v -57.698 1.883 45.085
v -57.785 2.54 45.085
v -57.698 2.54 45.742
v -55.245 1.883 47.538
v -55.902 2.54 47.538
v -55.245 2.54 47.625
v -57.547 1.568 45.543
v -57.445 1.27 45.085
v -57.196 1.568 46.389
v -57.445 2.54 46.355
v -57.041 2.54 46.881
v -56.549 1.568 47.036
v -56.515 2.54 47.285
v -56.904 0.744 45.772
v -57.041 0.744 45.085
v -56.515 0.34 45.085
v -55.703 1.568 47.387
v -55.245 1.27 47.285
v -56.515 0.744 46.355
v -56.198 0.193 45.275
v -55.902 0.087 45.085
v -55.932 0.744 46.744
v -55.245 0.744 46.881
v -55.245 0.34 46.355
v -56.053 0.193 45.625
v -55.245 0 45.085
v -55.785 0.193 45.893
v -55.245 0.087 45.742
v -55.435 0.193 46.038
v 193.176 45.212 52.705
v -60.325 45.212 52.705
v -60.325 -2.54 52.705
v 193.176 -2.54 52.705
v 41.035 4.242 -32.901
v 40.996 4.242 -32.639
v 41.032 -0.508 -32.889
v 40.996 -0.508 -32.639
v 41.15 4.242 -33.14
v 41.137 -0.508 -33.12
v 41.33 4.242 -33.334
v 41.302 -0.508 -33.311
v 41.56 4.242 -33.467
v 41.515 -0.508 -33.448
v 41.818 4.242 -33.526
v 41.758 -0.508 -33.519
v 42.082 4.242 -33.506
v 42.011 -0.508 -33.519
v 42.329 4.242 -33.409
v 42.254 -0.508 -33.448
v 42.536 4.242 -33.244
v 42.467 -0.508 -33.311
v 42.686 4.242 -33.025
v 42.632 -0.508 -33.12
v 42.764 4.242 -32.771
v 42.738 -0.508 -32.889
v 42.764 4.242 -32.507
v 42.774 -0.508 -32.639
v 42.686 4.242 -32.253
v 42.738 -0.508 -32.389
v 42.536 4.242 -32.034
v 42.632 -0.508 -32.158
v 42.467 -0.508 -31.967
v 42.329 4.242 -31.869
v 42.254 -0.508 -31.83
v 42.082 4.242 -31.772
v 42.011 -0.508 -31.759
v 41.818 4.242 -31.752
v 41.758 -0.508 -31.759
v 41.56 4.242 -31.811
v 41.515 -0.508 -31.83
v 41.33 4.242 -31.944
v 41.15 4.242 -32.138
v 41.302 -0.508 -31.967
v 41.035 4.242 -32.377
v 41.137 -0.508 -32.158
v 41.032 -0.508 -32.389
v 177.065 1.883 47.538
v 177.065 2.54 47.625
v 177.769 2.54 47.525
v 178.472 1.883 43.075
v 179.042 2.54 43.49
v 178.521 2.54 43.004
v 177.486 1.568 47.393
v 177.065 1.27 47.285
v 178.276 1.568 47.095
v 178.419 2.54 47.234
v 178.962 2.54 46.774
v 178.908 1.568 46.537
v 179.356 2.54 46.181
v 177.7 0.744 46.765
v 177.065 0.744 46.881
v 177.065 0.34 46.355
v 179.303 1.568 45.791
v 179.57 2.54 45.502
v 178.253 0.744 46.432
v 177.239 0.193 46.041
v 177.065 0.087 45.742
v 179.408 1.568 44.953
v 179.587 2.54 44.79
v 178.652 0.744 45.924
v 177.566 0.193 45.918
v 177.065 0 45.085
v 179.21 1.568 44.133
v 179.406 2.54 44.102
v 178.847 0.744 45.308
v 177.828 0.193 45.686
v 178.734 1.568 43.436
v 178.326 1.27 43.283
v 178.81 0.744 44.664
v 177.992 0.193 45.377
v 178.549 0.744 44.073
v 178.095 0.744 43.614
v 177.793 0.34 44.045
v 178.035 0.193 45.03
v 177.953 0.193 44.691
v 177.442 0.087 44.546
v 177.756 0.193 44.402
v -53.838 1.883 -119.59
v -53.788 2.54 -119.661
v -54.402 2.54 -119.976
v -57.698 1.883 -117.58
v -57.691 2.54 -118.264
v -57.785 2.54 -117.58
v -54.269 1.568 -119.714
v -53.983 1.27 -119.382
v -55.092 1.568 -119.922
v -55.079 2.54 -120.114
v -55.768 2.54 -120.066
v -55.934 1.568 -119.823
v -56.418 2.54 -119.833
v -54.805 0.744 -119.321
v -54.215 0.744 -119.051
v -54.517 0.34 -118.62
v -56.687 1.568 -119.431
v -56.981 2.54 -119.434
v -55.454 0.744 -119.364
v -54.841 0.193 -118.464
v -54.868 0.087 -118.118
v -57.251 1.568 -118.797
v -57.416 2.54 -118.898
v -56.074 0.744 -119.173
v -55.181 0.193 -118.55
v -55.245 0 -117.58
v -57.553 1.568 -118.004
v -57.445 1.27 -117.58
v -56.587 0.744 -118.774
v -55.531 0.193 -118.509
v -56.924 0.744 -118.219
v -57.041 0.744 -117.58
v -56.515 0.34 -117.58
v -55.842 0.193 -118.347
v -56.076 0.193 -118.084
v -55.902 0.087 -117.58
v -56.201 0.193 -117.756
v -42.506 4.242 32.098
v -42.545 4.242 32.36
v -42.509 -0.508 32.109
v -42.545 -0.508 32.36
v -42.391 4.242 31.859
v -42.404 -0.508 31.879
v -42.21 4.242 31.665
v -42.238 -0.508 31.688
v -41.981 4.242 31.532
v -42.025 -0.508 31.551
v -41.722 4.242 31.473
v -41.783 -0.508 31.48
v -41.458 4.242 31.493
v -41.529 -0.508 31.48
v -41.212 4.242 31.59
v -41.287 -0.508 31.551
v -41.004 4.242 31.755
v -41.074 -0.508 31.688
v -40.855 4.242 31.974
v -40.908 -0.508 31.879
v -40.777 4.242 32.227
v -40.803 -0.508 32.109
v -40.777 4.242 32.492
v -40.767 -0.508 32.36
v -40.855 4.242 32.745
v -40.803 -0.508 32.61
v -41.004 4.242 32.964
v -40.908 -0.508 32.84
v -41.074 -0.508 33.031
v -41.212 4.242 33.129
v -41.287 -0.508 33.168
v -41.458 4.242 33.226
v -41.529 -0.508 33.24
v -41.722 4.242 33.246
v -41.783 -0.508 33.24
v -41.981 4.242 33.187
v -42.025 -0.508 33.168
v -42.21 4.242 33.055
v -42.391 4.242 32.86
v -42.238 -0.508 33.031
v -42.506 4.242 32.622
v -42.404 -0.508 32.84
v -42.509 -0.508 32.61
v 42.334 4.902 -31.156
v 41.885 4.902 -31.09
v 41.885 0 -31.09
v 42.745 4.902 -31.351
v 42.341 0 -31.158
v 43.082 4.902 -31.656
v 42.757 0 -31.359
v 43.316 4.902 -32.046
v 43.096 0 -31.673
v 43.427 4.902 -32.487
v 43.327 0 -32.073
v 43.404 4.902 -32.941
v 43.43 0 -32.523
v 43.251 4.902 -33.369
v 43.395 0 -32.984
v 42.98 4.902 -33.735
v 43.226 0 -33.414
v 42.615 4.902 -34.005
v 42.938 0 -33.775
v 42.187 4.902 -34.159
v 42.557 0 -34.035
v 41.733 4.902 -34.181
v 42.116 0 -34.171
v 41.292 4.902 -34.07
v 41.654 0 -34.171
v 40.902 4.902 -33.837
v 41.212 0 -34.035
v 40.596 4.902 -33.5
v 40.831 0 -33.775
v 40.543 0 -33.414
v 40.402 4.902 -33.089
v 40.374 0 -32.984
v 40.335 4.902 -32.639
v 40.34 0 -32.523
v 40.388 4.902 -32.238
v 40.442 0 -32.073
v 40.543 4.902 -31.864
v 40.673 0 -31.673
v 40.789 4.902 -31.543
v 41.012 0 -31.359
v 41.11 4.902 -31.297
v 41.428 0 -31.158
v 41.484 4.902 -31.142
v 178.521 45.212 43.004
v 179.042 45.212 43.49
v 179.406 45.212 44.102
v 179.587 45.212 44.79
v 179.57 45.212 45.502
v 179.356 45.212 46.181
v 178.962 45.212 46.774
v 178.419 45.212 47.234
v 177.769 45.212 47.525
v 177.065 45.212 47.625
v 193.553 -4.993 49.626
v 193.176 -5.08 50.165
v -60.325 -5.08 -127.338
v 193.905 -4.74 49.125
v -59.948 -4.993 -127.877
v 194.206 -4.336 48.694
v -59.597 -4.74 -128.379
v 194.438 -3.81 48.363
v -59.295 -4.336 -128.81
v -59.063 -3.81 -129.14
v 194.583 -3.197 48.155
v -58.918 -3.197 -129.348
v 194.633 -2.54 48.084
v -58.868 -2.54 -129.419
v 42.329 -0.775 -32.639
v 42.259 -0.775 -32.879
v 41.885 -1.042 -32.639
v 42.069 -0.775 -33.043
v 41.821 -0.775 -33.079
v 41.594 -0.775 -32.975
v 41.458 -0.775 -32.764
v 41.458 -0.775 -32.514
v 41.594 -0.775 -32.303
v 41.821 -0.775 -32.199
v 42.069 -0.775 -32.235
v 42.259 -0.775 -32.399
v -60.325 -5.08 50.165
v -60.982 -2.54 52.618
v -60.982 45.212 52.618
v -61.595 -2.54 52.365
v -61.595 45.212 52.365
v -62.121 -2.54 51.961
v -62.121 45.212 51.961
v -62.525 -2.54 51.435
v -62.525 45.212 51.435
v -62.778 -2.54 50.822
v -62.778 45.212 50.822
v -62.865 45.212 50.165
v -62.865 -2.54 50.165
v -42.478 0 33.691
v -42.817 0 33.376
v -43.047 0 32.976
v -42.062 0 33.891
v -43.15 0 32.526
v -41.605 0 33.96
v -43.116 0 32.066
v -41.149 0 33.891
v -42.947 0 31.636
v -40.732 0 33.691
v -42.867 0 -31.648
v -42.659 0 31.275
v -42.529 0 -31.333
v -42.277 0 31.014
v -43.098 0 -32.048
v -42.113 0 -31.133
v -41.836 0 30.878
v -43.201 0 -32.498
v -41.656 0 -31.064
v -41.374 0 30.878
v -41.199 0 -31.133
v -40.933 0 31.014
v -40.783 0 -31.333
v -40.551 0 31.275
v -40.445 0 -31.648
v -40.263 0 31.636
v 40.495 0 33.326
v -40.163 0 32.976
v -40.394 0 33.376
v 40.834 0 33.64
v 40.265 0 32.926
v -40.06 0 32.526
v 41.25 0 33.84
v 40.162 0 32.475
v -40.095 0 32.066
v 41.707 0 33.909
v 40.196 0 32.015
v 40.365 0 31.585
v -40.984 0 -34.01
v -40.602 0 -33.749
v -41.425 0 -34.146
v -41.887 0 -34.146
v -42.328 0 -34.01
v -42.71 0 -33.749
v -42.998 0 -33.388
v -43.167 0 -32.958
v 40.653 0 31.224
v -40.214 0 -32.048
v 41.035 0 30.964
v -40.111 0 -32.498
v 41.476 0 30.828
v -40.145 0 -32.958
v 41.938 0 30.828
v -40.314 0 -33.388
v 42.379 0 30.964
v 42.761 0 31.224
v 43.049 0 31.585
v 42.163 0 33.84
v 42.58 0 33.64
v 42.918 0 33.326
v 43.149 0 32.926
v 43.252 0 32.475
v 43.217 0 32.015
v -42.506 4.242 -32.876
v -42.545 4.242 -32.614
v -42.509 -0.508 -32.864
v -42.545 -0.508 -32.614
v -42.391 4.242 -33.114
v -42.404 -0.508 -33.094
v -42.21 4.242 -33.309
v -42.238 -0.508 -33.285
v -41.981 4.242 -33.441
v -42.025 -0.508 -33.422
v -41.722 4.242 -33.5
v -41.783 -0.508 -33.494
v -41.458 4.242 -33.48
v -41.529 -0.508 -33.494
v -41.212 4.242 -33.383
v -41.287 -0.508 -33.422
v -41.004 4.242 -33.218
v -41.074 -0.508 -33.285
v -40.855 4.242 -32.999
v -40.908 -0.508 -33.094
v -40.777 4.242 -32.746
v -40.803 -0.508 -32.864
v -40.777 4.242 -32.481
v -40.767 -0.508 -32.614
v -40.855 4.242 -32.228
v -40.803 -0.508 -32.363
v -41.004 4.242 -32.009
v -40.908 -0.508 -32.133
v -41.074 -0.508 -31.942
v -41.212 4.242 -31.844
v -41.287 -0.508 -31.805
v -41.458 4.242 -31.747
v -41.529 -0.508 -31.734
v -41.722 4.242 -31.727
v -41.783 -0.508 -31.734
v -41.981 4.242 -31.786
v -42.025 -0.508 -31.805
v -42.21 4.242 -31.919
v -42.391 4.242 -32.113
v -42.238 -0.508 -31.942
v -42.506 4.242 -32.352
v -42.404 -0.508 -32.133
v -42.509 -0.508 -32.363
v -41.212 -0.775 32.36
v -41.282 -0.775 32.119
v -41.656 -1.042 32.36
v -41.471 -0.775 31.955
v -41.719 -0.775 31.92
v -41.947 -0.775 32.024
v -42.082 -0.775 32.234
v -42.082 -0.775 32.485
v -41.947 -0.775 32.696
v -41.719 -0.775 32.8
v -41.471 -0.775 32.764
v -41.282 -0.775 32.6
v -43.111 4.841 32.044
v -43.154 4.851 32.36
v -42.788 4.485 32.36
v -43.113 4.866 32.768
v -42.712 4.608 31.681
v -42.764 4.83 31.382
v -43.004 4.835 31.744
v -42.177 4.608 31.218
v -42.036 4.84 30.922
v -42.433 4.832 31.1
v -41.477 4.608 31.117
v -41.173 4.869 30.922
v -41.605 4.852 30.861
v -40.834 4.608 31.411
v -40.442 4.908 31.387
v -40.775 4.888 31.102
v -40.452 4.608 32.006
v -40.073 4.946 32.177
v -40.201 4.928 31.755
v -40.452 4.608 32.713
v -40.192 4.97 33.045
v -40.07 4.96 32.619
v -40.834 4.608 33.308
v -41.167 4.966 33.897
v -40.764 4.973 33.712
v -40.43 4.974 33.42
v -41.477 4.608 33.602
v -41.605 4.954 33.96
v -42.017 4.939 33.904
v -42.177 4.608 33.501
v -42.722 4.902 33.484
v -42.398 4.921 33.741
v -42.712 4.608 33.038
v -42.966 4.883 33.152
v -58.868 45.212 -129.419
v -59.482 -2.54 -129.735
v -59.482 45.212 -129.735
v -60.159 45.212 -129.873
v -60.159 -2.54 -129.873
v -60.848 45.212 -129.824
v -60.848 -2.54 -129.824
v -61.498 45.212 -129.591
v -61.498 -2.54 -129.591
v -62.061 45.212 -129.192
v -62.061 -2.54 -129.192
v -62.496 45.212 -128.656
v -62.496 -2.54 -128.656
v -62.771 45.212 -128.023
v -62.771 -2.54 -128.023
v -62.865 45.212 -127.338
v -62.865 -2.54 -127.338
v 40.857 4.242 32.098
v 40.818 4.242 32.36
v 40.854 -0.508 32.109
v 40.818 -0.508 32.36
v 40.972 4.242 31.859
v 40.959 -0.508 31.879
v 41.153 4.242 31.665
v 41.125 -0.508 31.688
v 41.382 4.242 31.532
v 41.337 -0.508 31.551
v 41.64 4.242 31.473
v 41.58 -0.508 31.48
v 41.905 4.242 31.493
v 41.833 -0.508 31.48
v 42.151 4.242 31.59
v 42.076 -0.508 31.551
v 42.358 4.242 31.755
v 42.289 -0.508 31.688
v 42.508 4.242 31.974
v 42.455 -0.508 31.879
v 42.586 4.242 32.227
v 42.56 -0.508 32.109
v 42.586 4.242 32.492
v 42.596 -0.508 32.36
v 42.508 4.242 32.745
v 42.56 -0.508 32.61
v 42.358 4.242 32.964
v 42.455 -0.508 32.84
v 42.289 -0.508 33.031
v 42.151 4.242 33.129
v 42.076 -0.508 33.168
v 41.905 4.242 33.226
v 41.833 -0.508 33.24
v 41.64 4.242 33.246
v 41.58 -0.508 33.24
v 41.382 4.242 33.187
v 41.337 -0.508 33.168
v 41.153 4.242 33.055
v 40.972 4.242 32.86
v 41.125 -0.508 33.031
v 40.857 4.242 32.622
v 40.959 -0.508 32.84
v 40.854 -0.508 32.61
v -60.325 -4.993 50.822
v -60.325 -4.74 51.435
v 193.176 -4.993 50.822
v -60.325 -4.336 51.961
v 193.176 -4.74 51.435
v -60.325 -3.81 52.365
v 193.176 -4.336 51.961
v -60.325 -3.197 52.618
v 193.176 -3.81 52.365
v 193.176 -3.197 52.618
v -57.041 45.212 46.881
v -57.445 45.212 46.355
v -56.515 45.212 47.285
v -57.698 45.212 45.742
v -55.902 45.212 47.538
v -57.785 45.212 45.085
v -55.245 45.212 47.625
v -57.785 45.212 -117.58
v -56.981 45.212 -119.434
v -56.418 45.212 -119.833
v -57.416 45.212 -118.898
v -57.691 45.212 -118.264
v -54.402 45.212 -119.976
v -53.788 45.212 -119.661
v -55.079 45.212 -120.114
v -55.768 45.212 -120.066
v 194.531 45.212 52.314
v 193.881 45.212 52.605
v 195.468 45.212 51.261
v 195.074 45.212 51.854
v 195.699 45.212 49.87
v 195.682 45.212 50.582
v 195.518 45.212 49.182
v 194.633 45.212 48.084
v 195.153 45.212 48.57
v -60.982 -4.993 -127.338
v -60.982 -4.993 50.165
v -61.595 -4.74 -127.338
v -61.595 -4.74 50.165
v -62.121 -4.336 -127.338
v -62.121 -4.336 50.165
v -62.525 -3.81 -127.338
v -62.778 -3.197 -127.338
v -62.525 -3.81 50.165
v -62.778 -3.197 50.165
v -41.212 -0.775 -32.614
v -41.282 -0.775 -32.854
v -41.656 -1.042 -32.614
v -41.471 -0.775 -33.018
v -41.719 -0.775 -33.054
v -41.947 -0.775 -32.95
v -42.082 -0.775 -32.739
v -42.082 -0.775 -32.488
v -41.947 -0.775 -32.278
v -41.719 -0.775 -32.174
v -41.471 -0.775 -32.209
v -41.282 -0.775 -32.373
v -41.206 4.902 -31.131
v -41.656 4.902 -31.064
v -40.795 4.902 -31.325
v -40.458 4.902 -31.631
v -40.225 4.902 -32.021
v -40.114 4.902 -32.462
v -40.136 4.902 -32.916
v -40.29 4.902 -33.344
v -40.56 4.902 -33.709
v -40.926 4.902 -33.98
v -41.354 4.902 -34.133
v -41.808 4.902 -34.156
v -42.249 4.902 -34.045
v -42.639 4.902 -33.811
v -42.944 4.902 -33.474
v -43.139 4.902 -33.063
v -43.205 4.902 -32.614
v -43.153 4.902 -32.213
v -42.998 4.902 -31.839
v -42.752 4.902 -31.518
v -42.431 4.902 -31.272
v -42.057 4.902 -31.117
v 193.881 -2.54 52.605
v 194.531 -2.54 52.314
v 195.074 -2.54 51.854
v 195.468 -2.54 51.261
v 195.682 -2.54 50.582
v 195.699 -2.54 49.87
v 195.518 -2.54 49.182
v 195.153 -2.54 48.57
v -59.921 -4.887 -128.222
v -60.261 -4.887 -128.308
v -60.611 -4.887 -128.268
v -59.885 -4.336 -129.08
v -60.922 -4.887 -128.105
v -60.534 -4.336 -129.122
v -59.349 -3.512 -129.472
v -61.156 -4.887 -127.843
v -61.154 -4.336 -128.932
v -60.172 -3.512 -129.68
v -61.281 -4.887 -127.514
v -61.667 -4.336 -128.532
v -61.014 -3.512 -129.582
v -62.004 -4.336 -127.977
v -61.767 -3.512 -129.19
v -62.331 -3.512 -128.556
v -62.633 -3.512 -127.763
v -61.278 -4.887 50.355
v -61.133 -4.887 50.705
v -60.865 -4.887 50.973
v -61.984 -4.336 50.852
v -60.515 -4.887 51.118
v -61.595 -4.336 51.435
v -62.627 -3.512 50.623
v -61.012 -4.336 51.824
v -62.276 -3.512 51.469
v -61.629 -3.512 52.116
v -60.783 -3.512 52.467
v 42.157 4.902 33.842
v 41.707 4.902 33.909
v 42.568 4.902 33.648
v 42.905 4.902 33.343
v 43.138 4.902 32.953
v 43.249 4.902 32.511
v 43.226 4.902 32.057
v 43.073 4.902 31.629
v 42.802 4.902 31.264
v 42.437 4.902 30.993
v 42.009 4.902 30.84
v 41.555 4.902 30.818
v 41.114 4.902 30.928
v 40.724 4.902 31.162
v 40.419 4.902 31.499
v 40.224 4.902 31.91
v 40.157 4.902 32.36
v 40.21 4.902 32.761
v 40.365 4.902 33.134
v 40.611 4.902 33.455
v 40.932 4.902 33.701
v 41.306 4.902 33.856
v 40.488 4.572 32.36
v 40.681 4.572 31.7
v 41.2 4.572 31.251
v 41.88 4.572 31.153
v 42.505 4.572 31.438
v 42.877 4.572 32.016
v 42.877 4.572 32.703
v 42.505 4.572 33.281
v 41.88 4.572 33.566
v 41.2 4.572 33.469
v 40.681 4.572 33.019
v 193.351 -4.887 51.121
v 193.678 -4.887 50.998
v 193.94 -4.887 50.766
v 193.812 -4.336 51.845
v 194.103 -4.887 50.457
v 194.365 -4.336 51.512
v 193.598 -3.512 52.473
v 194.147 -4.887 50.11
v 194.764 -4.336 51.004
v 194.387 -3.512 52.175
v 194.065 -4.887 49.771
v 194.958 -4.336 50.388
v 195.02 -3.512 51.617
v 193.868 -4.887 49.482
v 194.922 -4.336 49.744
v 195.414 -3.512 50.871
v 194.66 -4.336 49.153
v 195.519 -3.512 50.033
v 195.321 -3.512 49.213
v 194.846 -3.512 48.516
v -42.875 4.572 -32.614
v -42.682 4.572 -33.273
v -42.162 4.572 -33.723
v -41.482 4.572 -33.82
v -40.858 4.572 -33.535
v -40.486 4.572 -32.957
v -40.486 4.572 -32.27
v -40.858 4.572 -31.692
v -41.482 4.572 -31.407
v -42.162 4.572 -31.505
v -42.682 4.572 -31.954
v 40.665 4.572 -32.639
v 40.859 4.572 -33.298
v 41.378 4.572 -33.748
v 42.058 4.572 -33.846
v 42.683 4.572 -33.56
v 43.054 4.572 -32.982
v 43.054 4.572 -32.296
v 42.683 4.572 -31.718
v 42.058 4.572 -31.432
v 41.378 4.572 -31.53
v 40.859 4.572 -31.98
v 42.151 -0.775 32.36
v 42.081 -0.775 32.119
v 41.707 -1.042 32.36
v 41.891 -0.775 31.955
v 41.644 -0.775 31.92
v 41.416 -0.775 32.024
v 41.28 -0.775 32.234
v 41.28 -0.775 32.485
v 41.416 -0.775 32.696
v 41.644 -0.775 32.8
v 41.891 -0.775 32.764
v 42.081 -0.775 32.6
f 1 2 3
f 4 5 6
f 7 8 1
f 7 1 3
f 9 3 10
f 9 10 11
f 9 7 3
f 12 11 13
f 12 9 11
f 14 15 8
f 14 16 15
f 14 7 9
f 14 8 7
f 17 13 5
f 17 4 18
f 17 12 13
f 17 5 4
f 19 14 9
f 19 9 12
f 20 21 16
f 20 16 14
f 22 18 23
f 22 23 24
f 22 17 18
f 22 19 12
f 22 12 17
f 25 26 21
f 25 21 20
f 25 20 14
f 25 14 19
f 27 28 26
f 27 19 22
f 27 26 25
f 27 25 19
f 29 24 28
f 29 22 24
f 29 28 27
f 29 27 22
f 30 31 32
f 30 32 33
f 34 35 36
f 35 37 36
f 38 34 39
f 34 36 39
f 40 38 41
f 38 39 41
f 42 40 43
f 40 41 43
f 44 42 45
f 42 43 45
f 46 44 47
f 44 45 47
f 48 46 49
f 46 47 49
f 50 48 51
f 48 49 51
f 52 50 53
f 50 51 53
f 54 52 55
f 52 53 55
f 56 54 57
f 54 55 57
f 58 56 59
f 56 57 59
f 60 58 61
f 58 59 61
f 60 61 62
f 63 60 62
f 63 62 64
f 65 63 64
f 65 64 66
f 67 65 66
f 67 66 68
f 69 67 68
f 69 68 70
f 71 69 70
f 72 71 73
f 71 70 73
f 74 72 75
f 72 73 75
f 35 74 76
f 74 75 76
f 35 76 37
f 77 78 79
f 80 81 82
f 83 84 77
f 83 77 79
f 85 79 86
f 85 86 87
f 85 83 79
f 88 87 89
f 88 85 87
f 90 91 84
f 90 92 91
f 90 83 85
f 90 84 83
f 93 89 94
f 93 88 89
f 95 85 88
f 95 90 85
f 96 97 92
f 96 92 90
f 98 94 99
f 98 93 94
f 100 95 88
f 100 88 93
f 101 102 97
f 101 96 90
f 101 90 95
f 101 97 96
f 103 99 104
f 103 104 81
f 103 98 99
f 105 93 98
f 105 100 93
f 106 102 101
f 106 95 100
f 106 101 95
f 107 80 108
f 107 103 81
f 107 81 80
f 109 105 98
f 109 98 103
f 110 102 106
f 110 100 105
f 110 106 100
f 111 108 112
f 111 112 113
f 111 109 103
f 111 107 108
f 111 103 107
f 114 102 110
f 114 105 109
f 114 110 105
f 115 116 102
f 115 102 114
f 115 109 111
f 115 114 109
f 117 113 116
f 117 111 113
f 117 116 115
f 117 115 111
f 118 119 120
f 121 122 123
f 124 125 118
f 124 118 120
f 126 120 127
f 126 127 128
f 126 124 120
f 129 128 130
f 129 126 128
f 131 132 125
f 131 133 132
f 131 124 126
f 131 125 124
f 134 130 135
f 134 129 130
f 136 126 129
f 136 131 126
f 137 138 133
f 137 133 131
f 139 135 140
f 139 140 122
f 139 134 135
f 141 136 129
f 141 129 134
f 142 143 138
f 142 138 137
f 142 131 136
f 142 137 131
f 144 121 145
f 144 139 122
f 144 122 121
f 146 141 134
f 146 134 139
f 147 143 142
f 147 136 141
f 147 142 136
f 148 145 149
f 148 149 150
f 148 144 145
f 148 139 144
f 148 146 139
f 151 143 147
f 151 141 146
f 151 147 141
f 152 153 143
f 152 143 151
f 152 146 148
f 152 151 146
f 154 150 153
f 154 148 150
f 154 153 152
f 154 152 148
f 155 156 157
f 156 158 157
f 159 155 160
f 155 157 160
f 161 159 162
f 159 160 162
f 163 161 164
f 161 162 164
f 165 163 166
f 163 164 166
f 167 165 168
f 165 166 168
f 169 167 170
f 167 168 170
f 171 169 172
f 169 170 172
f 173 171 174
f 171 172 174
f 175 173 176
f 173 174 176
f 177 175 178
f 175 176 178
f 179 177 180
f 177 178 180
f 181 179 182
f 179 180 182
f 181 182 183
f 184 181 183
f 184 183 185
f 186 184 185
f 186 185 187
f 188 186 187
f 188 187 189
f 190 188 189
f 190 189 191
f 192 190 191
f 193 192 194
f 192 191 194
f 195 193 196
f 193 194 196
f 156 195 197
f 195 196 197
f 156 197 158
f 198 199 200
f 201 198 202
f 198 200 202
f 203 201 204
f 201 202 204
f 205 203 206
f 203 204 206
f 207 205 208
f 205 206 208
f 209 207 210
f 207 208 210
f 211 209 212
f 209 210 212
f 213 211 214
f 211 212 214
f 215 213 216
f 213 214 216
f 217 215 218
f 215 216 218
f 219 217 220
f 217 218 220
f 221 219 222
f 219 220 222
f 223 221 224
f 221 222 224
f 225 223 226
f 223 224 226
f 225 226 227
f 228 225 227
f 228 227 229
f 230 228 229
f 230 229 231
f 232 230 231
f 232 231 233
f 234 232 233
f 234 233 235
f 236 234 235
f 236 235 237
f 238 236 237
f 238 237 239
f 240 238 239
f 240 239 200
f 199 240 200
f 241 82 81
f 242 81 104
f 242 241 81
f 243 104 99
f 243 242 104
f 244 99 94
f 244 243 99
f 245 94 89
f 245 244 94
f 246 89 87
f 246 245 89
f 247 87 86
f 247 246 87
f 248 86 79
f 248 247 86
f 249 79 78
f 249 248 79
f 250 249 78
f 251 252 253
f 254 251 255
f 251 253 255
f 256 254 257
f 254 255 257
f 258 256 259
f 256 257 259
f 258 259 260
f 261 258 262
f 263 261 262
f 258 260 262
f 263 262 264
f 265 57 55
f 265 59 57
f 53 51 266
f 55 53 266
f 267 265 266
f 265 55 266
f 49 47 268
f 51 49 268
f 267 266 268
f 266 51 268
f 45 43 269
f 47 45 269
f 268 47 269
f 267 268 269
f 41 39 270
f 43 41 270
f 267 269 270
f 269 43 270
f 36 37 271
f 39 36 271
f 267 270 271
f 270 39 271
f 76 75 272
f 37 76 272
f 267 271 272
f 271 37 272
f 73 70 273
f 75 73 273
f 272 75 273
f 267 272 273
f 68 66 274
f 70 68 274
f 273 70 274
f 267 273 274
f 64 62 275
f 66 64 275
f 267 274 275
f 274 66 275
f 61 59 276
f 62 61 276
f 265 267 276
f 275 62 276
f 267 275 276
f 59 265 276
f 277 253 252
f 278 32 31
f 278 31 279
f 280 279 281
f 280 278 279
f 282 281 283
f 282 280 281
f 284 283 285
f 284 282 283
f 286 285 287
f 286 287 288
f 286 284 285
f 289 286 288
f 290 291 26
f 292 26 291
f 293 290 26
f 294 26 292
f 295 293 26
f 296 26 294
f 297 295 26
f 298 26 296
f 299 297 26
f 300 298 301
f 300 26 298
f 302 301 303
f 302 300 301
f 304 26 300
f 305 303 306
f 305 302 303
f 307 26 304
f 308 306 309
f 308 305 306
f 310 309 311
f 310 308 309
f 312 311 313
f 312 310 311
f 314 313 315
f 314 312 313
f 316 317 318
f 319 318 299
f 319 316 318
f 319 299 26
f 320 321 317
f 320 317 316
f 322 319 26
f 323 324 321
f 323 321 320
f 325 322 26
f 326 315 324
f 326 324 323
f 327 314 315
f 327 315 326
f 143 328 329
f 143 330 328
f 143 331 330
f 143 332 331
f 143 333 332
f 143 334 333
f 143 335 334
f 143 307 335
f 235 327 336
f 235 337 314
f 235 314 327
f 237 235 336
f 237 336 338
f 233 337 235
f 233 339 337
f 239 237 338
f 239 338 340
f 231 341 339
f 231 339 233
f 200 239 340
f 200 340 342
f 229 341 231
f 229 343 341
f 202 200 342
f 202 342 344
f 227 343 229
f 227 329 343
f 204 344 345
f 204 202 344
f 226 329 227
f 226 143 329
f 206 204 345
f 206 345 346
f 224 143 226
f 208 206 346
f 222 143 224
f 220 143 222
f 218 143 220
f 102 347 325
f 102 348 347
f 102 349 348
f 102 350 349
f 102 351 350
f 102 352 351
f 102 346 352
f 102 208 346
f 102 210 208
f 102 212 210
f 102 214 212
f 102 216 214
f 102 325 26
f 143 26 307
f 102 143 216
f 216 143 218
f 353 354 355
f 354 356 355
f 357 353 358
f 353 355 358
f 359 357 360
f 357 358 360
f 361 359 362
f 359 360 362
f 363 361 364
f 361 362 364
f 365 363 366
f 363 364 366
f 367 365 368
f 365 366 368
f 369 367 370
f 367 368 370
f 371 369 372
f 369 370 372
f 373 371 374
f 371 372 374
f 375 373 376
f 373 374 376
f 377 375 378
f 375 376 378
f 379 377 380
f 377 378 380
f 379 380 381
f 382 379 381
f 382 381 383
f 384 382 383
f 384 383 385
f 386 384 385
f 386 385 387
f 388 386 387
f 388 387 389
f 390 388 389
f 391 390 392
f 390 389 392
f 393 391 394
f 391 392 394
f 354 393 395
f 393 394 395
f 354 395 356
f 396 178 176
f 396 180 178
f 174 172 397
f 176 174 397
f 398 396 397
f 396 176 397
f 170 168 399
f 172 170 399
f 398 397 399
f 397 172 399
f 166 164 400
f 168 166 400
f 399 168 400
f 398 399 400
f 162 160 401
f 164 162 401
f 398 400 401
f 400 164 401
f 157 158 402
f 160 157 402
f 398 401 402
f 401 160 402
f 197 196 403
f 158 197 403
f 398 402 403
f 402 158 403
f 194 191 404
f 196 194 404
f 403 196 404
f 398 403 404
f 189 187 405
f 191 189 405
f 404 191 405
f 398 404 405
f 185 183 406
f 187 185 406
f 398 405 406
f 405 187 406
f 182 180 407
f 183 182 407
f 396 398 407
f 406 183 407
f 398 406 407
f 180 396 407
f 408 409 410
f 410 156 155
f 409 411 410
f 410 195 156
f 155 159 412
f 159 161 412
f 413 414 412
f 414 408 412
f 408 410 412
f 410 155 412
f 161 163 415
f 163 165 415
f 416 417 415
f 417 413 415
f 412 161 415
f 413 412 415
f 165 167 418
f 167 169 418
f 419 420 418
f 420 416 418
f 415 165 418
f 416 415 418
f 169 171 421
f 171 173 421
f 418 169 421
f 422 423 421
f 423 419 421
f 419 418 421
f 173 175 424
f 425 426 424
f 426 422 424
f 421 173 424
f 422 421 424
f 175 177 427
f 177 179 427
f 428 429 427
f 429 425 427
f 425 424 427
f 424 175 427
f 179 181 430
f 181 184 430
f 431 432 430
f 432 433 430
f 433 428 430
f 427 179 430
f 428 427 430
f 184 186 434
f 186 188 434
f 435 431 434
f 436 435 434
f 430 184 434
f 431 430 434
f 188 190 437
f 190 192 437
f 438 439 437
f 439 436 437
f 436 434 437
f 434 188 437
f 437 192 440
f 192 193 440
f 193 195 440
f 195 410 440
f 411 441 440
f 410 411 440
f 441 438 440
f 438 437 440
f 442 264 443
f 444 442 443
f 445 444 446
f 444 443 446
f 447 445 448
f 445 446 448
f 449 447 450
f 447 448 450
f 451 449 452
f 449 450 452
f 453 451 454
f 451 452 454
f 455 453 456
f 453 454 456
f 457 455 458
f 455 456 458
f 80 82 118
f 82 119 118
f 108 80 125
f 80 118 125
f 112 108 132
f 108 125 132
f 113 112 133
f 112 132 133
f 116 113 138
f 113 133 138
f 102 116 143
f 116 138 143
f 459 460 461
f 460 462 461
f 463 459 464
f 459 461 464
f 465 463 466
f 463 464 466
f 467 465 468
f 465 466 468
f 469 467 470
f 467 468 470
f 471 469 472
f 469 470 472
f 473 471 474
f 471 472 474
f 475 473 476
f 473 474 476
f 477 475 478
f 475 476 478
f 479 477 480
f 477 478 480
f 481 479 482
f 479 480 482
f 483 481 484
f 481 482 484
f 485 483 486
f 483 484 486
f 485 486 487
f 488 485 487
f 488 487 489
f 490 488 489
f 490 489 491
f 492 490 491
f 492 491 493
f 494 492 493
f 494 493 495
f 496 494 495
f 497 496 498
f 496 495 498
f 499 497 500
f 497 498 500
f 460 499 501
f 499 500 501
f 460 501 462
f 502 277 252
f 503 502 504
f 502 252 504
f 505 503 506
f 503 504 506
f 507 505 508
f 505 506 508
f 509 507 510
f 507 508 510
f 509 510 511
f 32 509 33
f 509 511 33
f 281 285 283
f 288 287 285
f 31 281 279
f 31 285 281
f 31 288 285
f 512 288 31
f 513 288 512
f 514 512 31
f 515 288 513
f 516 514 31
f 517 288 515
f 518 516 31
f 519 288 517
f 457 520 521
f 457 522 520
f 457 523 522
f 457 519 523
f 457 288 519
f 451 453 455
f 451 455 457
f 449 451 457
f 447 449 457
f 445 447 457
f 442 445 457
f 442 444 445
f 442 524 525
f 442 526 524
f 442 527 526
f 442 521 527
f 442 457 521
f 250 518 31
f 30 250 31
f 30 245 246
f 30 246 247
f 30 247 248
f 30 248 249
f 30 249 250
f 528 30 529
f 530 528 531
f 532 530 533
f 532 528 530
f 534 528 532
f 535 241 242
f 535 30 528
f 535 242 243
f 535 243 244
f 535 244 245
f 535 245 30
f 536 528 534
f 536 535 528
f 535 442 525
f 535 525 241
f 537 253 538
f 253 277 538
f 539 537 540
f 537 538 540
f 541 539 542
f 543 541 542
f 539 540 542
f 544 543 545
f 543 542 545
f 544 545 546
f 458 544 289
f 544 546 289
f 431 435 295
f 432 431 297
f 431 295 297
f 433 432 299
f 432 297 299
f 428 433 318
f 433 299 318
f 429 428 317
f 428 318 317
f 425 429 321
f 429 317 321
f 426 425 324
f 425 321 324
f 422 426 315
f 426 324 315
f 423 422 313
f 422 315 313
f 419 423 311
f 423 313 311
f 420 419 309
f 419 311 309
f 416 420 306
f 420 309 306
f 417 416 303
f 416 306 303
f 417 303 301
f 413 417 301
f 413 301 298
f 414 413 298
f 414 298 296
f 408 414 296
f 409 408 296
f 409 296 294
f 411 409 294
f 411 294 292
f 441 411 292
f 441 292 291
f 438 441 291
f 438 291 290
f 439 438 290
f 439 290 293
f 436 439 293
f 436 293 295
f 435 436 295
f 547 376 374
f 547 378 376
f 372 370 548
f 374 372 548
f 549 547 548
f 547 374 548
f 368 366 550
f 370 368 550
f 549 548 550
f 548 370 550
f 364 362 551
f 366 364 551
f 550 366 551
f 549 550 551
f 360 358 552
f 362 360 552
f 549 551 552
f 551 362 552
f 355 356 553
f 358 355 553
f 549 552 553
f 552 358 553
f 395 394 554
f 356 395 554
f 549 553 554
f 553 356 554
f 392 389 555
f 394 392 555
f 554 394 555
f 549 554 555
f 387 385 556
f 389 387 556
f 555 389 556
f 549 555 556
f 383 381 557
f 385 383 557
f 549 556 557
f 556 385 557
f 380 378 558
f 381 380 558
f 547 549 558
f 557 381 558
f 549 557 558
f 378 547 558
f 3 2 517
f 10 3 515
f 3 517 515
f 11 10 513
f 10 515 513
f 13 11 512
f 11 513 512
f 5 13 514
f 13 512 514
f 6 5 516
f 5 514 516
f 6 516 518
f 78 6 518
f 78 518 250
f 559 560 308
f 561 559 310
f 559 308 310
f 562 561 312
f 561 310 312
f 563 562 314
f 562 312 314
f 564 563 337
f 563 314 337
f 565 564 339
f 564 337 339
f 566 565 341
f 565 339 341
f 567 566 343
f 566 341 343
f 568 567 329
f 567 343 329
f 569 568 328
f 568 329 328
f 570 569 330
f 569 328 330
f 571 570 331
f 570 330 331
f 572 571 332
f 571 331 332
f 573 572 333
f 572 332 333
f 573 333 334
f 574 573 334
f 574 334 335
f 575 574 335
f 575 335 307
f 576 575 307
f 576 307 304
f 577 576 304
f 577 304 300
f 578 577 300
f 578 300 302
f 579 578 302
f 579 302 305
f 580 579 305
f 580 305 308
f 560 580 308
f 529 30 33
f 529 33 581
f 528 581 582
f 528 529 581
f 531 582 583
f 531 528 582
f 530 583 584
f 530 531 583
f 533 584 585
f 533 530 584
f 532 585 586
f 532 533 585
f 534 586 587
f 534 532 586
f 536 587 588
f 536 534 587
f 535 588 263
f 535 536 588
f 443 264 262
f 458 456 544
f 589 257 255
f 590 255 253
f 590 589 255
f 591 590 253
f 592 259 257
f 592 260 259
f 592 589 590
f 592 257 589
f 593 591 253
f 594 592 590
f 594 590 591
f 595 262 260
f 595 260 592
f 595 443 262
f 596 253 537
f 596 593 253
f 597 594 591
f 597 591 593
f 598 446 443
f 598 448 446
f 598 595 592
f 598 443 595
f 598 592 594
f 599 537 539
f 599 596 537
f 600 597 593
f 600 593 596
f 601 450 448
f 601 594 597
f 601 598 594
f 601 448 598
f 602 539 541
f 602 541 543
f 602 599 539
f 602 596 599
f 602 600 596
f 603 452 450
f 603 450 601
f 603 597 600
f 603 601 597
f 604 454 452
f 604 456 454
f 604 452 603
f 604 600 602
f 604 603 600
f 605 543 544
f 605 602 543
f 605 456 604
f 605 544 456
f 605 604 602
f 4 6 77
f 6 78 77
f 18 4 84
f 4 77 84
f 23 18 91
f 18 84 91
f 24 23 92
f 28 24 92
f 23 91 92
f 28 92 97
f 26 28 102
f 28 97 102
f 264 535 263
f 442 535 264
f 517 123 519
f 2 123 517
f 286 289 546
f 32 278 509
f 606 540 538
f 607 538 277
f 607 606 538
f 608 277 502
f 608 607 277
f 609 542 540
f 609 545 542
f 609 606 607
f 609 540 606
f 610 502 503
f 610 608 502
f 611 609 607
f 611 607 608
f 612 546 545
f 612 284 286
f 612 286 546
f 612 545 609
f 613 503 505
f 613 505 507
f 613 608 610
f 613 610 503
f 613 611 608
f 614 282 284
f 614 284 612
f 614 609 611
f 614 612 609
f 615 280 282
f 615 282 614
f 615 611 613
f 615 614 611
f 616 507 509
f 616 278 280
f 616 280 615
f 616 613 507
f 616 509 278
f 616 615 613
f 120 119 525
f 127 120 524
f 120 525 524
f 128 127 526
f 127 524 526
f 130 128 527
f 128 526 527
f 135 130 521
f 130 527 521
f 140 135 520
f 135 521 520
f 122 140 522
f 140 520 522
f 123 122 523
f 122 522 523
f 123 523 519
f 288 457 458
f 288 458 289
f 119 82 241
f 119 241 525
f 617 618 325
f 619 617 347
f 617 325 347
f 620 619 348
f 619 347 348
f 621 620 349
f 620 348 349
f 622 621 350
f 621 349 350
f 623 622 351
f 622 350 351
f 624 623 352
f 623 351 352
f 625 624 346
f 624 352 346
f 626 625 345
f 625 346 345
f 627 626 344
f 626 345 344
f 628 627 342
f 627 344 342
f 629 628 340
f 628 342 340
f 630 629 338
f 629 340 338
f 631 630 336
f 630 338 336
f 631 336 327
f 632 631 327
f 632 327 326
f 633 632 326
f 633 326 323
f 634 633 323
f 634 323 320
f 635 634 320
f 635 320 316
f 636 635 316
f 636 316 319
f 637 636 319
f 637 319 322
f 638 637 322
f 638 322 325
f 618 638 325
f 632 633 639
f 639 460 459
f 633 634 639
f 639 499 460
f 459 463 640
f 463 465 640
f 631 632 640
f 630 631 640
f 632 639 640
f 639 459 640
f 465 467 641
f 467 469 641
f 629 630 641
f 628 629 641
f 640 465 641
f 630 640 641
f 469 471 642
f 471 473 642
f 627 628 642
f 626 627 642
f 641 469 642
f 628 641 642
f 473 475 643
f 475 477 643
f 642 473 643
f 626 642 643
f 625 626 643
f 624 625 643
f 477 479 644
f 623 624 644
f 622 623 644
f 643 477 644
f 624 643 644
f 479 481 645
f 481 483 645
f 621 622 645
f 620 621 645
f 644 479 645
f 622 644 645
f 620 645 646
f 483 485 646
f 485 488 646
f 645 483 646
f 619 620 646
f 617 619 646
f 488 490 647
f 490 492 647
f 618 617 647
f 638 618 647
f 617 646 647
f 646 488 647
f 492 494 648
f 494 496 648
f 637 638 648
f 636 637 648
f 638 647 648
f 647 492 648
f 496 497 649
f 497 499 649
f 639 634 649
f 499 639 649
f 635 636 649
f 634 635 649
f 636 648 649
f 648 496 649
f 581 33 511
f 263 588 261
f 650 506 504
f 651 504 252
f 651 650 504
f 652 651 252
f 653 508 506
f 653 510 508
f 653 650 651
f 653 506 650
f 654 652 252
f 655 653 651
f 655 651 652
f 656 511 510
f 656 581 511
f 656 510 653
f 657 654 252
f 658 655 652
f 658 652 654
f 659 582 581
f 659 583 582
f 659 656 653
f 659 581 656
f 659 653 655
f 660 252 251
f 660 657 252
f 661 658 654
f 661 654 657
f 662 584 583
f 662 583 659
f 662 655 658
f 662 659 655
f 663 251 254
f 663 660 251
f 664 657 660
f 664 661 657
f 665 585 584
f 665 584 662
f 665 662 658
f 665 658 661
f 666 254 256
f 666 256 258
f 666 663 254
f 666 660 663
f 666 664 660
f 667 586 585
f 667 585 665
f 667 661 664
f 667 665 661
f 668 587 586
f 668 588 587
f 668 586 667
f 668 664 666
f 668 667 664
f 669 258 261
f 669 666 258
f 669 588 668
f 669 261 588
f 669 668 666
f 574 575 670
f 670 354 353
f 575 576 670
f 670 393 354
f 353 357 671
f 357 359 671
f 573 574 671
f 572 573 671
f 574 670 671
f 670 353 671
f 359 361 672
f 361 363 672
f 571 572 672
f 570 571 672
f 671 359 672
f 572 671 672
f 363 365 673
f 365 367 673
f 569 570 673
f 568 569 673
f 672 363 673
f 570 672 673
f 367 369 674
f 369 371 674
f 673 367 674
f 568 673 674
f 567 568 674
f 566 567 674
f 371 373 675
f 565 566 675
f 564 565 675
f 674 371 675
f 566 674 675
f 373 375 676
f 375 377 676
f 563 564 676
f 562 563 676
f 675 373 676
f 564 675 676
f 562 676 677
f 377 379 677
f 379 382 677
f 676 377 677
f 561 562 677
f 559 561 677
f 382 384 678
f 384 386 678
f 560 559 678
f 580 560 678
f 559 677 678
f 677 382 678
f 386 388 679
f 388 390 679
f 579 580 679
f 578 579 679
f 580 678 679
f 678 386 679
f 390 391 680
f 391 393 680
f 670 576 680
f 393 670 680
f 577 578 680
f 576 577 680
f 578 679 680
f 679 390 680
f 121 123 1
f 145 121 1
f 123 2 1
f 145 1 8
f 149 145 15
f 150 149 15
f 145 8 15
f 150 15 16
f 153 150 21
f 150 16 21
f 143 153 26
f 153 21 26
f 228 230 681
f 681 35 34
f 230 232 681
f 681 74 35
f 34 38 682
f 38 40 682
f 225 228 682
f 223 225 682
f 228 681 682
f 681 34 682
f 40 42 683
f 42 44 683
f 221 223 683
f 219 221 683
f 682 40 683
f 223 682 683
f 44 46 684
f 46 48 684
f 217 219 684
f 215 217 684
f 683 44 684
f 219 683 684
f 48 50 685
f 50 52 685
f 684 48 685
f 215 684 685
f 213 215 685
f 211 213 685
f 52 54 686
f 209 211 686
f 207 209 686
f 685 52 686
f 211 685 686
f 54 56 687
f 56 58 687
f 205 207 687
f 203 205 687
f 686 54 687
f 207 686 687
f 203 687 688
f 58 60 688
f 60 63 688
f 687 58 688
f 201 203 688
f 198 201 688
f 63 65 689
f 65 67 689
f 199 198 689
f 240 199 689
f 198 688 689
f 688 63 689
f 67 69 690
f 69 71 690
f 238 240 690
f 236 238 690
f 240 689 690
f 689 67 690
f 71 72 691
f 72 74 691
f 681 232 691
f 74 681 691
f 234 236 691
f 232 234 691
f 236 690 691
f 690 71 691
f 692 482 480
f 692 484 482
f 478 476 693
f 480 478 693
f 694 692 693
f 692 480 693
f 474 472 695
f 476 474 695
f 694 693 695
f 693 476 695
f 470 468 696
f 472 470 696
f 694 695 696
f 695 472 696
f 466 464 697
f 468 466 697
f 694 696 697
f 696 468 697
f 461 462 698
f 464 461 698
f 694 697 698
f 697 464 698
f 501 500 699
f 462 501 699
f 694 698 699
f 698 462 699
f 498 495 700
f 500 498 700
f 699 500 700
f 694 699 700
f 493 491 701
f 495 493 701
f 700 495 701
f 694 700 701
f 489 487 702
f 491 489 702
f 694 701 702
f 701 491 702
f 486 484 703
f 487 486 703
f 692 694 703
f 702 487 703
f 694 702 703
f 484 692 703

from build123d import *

# Parameters (mm, degrees)
BOSS_EXTRUDE1_DEPTH             = 45.212
BOSS_EXTRUDE2_DEPTH             = 5.08
SKETCH1_4_R                     = 1.5494
BOSS_EXTRUDE3_DEPTH             = 5.08
FILLET1_R                       = 2.54
F_2_56_TAPPED_HOLE1_D           = 1.778
F_2_56_TAPPED_HOLE1_DEPTH       = 5.588
F_2_56_TAPPED_HOLE1_CSINK_D     = 3.4544
F_2_56_TAPPED_HOLE1_CSINK_ANGLE = 90
F_2_56_TAPPED_HOLE1_TIP         = 0.53416509
FILLET3_R                       = 2.54
FILLET4_R                       = 2.54


with BuildPart() as part:
    # Sketch1 → Boss-Extrude1 (new body)
    with BuildSketch(Plane(origin=(0, 0, 0), x_dir=(1, 0, 0), z_dir=(0, 1, 0))):
        Polygon((201.232093857, -52.705), (-62.865, 132.217775938), (-62.865, -52.705), align=None)
        Polygon((-57.785, -47.625), (-57.785, 122.459186733), (185.120392261, -47.625), align=None, mode=Mode.SUBTRACT)
    extrude(amount=BOSS_EXTRUDE1_DEPTH)

    # Sketch1<3> → Boss-Extrude2 (add)
    with BuildSketch(Plane(origin=(0, 0, 0), x_dir=(1, 0, 0), z_dir=(0, 1, 0))):
        Polygon((201.232093857, -52.705), (-62.865, 132.217775938), (-62.865, -52.705), align=None)
    extrude(amount=-BOSS_EXTRUDE2_DEPTH)

    # Sketch1<4> → Boss-Extrude3 (add)
    with BuildSketch(Plane(origin=(0, 0, 0), x_dir=(1, 0, 0), z_dir=(0, 1, 0))):
        with Locations((-41.656, 32.6136)):
            Circle(SKETCH1_4_R)
        with Locations((41.8846, 32.639)):
            Circle(SKETCH1_4_R)
        with Locations((41.7068, -32.3596)):
            Circle(SKETCH1_4_R)
        with Locations((-41.6052, -32.4104)):
            Circle(SKETCH1_4_R)
    extrude(amount=BOSS_EXTRUDE3_DEPTH)

    # Fillet1
    fillet1_edges = [part.edges().sort_by_distance(p)[0] for p in [
        (-62.865, 20.066, -132.217775938),
        (201.232093857, 20.066, 52.705),
        (-62.865, 20.066, 52.705),
        (-57.785, 22.606, 47.625),
        (185.120392261, 22.606, 47.625),
        (-57.785, 22.606, -122.459186733),
    ]]
    fillet(fillet1_edges, radius=FILLET1_R)

    # #2-56 Tapped Hole1
    with Locations(Plane(origin=(0, 5.08, 0), x_dir=(1, 0, 0), z_dir=(0, 1, 0))):
        with Locations((41.8846, 32.639), (-41.656, 32.6136), (41.7068, -32.3596), (-41.656, -32.3596)):
            CounterSinkHole(F_2_56_TAPPED_HOLE1_D / 2, F_2_56_TAPPED_HOLE1_CSINK_D / 2, depth=F_2_56_TAPPED_HOLE1_DEPTH, counter_sink_angle=F_2_56_TAPPED_HOLE1_CSINK_ANGLE)
            with Locations((0, 0, -(F_2_56_TAPPED_HOLE1_DEPTH + F_2_56_TAPPED_HOLE1_TIP / 2))):  # 118° drill point
                Cone(0, F_2_56_TAPPED_HOLE1_D / 2, F_2_56_TAPPED_HOLE1_TIP, mode=Mode.SUBTRACT)

    # Fillet3
    fillet3_edges = [part.edges().sort_by_distance(p)[0] for p in [
        (-61.497841478, -5.08, -129.591488852),
        (195.598684114, -5.08, 50.928792731),
        (-62.121051224, -5.08, 51.961051224),
        (67.882505678, -5.08, -40.66738686),
        (66.425621529, -5.08, 52.705),
        (-62.865, -5.08, -38.586740668),
    ]]
    fillet(fillet3_edges, radius=FILLET3_R)

    # Fillet4
    fillet4_edges = [part.edges().sort_by_distance(p)[0] for p in [
        (179.486982518, 0, 45.848792731),
        (-57.041051224, 0, 46.881051224),
        (-56.417841478, 0, -119.832899647),
        (-57.785, 0, -36.247446065),
        (60.909770731, 0, 47.625),
        (62.36665488, 0, -38.328092258),
    ]]
    fillet(fillet4_edges, radius=FILLET4_R)


solid = part.part
